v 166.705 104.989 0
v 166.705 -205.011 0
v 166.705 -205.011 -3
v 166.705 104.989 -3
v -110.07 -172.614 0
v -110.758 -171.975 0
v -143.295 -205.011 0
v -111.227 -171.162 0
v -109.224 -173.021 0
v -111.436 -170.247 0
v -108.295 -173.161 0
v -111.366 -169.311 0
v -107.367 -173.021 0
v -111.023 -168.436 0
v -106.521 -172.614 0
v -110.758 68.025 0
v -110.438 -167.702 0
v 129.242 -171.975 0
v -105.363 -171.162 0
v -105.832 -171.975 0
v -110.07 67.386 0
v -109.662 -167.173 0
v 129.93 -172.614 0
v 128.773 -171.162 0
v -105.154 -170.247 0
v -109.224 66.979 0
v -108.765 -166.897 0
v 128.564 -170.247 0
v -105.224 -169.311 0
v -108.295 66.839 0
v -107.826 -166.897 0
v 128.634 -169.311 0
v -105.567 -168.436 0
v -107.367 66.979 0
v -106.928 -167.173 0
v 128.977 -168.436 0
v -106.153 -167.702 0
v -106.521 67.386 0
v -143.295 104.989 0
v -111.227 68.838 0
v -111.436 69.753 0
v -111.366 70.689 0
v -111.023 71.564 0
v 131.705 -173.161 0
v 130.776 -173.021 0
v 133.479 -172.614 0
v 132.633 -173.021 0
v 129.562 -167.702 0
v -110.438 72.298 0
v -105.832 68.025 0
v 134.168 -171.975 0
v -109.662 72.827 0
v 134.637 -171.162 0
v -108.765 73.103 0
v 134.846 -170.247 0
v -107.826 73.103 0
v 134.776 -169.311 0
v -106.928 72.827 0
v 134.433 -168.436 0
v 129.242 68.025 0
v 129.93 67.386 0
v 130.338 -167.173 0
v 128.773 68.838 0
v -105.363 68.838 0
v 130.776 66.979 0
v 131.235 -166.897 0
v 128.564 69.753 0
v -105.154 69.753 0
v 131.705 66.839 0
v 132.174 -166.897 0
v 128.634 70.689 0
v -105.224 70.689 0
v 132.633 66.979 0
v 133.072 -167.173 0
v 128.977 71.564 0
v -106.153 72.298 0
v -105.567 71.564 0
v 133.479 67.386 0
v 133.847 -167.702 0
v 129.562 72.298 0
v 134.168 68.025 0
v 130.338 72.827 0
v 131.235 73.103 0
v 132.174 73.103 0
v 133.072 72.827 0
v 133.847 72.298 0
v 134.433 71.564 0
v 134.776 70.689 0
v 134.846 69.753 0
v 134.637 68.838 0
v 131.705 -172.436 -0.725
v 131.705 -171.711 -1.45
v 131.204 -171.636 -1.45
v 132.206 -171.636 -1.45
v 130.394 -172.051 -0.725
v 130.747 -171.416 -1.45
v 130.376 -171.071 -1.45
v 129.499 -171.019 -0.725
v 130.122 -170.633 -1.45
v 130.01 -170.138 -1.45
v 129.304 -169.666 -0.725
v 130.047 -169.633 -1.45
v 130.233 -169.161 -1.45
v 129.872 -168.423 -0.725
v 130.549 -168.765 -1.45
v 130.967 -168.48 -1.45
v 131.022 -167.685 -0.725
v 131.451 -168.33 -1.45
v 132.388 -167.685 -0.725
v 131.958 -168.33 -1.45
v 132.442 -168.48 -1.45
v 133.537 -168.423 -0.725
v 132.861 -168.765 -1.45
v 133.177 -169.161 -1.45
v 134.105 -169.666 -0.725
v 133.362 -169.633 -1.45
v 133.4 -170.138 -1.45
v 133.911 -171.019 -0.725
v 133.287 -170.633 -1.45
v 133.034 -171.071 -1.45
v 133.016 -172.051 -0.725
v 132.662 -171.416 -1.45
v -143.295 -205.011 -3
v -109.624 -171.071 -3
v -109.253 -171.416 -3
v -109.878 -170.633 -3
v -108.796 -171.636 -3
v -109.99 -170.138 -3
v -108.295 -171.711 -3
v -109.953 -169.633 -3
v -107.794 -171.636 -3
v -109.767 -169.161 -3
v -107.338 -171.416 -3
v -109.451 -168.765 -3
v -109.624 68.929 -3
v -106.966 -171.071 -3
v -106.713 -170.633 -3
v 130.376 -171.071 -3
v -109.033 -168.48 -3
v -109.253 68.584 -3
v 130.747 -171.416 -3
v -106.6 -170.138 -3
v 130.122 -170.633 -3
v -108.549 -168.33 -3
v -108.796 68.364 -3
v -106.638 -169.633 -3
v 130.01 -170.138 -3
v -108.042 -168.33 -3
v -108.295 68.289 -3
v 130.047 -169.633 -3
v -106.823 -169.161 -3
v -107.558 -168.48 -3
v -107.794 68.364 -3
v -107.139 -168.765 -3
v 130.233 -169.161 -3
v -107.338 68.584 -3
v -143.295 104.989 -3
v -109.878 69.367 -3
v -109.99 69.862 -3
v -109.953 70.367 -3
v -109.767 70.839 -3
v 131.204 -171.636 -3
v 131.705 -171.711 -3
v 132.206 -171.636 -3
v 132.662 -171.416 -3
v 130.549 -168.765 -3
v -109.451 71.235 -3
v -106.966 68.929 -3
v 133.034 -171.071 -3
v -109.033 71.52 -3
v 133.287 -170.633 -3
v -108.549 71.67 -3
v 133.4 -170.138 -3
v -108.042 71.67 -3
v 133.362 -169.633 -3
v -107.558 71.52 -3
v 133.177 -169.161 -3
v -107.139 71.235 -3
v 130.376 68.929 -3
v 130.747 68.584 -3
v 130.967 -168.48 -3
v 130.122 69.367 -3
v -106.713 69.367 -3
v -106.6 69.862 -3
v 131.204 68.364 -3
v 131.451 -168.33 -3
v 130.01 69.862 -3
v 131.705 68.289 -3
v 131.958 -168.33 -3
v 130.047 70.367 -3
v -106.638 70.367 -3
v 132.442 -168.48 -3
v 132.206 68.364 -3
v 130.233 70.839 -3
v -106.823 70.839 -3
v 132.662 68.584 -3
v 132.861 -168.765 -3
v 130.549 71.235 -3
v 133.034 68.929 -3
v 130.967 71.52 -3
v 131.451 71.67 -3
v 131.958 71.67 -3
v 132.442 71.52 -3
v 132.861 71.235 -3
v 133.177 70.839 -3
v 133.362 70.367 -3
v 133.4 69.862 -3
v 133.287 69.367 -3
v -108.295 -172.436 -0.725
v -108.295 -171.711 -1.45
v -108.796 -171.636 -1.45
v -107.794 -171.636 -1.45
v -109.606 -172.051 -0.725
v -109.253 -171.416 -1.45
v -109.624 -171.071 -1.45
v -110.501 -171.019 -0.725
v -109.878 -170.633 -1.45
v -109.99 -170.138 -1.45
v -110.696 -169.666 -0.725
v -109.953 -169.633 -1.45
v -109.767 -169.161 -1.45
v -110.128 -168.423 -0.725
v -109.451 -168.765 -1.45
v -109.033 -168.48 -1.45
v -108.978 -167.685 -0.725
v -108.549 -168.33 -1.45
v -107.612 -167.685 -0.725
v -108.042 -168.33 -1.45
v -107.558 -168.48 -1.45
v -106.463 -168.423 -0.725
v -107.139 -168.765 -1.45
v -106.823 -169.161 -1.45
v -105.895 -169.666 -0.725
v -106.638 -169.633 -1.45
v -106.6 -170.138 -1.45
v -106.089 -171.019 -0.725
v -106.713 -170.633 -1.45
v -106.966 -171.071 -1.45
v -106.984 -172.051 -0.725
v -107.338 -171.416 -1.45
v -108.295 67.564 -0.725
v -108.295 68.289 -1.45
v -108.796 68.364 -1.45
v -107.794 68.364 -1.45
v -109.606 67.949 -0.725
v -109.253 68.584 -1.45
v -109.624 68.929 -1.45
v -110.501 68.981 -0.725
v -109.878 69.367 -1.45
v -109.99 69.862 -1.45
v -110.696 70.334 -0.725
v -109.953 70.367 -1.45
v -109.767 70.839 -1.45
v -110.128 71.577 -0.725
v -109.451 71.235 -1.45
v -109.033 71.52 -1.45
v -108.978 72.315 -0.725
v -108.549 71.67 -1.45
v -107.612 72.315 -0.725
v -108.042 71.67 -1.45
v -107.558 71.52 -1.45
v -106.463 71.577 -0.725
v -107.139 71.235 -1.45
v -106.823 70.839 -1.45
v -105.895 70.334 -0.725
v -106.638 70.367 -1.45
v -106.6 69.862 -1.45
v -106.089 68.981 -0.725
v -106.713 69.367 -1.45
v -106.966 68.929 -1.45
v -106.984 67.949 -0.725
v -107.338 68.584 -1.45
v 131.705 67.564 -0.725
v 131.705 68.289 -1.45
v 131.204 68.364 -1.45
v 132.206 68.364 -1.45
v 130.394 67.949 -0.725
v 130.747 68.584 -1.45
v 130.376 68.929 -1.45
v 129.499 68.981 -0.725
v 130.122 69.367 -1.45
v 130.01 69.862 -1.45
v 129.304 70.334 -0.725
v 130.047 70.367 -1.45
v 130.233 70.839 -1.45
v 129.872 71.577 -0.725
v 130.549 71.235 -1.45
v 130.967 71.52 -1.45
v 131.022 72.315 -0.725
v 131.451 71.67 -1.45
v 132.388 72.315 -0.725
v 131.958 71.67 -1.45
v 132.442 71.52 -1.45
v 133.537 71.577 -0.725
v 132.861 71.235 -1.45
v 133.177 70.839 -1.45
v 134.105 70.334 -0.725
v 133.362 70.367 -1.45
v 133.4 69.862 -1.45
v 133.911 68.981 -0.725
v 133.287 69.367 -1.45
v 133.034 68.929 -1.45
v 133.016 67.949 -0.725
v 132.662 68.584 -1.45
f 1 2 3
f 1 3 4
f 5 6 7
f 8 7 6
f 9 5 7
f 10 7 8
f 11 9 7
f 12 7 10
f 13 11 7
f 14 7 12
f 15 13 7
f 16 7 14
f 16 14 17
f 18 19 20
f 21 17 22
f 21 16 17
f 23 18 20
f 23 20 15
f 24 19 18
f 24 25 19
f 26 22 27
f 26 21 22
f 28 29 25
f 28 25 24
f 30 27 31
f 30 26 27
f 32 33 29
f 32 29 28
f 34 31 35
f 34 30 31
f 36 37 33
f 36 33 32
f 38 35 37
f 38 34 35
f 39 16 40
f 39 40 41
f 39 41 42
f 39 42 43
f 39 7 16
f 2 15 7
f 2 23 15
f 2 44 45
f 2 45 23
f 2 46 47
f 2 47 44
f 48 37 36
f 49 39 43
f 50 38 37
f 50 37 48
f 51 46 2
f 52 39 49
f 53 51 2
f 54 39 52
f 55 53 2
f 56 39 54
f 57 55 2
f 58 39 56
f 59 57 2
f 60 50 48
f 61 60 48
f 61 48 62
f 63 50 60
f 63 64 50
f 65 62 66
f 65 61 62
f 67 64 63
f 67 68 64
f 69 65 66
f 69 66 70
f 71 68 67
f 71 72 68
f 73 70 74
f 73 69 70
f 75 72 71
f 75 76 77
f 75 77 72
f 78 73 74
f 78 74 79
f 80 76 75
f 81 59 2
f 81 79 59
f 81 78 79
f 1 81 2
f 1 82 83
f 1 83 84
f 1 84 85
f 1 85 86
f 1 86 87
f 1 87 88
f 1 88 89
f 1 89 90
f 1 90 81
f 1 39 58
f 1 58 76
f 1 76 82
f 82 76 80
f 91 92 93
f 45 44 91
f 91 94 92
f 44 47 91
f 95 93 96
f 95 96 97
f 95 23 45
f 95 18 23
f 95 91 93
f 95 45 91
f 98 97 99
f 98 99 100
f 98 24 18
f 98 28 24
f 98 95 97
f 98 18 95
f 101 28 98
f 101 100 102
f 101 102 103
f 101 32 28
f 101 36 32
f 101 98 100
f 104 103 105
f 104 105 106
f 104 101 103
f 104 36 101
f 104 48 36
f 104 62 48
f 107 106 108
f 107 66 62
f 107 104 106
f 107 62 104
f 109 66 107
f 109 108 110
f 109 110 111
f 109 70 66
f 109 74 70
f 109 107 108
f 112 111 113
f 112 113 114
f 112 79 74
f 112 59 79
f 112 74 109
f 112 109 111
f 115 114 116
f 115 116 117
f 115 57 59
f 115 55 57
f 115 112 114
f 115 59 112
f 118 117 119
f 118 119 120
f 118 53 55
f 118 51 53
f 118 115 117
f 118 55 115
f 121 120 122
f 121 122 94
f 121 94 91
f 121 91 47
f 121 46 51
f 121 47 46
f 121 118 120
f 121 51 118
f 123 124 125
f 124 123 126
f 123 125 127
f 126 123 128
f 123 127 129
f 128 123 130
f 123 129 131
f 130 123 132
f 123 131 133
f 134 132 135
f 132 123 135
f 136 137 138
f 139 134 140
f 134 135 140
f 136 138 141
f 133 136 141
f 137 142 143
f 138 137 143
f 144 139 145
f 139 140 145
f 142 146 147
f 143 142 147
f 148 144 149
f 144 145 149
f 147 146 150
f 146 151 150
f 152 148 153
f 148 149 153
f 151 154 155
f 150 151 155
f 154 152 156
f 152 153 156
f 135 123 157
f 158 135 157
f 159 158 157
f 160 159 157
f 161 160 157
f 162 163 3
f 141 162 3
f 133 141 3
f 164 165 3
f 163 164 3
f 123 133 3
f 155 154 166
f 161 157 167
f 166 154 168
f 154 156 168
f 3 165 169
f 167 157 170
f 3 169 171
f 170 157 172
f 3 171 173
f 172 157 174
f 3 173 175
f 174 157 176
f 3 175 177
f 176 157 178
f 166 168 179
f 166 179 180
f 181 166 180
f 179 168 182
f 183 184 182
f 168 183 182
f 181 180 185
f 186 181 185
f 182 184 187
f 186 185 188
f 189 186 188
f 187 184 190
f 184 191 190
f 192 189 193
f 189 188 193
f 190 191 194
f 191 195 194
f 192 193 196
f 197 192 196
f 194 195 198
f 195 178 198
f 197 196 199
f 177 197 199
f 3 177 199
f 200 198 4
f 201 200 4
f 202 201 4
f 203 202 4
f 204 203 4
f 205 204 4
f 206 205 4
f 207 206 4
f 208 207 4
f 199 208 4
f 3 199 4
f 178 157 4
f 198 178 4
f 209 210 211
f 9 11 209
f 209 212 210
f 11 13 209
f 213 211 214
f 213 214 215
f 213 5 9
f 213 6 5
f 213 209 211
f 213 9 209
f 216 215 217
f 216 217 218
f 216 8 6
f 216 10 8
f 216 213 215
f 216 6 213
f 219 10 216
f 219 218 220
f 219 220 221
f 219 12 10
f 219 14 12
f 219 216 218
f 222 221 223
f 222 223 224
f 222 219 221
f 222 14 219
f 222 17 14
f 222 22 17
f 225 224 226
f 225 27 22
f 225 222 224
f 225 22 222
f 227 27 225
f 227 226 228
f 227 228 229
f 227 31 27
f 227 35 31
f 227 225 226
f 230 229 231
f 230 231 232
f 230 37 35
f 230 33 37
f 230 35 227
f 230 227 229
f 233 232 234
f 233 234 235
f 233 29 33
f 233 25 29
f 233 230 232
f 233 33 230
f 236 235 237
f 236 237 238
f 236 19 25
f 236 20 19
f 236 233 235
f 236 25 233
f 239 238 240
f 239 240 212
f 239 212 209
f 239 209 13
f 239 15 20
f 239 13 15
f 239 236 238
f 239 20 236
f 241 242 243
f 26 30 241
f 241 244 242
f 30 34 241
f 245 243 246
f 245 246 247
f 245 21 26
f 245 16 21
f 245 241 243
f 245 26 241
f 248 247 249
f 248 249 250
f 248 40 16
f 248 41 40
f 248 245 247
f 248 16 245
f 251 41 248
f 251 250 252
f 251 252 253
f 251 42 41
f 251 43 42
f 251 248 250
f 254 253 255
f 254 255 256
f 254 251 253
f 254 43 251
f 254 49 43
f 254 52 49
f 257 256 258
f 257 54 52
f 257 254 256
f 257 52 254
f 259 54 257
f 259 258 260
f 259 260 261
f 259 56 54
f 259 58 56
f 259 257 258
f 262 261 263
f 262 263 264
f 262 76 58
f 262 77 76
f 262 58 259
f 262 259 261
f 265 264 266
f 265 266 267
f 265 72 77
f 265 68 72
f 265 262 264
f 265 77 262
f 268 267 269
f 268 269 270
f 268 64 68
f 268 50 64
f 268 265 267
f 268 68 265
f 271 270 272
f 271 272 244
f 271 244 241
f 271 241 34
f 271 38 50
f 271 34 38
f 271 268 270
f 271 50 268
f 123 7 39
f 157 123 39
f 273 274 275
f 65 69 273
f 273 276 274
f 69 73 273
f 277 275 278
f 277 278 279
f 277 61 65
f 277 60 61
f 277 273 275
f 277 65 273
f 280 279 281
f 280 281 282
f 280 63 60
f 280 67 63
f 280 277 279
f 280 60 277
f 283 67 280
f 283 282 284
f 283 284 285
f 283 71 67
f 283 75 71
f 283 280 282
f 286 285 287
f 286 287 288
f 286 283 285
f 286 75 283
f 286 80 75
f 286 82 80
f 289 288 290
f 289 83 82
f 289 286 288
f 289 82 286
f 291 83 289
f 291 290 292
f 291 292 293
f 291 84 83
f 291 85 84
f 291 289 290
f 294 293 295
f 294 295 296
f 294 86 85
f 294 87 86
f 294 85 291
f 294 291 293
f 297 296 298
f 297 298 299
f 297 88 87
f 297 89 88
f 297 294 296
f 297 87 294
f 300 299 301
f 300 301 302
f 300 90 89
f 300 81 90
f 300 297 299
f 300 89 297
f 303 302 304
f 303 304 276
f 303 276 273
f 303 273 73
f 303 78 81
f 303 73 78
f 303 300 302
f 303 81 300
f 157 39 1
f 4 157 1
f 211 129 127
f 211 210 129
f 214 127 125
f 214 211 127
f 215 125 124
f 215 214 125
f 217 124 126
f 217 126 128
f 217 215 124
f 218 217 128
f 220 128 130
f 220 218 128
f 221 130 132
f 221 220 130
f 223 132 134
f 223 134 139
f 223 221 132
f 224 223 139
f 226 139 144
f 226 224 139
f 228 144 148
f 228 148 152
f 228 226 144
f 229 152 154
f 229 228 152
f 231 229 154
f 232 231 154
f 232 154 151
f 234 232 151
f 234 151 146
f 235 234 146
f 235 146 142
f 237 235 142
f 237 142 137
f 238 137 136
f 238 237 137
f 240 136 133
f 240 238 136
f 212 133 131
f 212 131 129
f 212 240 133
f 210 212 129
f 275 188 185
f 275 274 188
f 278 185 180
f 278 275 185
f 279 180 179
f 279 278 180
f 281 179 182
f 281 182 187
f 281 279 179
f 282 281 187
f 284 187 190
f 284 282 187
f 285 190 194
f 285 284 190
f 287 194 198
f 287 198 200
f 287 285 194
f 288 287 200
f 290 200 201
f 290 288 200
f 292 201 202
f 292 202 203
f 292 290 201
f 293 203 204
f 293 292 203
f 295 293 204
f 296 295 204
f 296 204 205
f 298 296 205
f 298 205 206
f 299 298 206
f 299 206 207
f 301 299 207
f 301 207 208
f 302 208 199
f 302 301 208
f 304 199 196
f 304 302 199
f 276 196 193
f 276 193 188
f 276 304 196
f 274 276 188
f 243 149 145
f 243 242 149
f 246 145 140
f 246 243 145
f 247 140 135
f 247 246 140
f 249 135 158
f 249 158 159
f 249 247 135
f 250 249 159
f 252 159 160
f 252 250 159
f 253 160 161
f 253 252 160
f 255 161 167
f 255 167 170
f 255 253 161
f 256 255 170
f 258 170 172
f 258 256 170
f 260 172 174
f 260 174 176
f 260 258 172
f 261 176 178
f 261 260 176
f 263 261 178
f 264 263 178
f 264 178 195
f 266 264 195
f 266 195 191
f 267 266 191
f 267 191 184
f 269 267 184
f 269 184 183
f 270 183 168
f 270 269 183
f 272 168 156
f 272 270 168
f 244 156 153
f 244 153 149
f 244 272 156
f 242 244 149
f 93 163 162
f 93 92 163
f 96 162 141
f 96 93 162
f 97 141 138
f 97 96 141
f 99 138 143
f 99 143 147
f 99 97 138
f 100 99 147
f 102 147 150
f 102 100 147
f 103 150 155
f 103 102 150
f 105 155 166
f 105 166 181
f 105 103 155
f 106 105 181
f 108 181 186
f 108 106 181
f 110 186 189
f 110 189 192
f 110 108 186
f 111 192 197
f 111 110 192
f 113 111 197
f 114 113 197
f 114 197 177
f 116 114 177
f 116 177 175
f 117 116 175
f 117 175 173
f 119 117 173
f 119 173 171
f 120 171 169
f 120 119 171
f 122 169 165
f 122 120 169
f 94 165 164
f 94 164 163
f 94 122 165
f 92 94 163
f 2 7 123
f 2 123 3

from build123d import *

# Parameters (mm, degrees)
SKETCH_1_W                  = 310
SKETCH_1_H                  = 310
EXTRUDE_1_DEPTH             = 3
HOLE_WIZARD_M3_1_AT_2_COUNT = 2
HOLE_WIZARD_M3_1_AT_2_PITCH = 240
HOLE_WIZARD_M3_1_AT_3_COUNT = 2
HOLE_WIZARD_M3_1_AT_3_PITCH = 339.41125497
HOLE_WIZARD_M3_1_AT_4_COUNT = 2
HOLE_WIZARD_M3_1_AT_4_PITCH = 240


with BuildPart() as part:
    # 草图1 → 凸台-拉伸1 (new body)
    with BuildSketch(Plane.XY):
        with Locations((11.704805492, -50.011441648)):
            Rectangle(SKETCH_1_W, SKETCH_1_H)
    extrude(amount=-EXTRUDE_1_DEPTH)

    # 草图3 → M3 平头机械螺钉的锥形沉头孔1 (revolve, cut)
    with BuildSketch(Plane(origin=(-108.295194508, 69.988558352, 0), x_dir=(0, -1, 0), z_dir=(1, 0, 0))):
        Polygon((0, 0), (0, 3), (1.7, 3), (1.7, 1.45), (3.15, 0), align=None)
    hole_wizard_m3_1 = revolve(axis=Axis((-108.295194508, 69.988558352, 6.35), (0, 0, -1)), mode=Mode.SUBTRACT)

    # M3 平头机械螺钉的锥形沉头孔1 at 2: M3 平头机械螺钉的锥形沉头孔1 ×2
    with Locations(*[(i * HOLE_WIZARD_M3_1_AT_2_PITCH, 0, 0) for i in range(1, HOLE_WIZARD_M3_1_AT_2_COUNT)]):
        add(hole_wizard_m3_1, mode=Mode.SUBTRACT)

    # M3 平头机械螺钉的锥形沉头孔1 at 3: M3 平头机械螺钉的锥形沉头孔1 ×2
    with Locations(*[Vector(0.707106781, -0.707106781, 0) * (i * HOLE_WIZARD_M3_1_AT_3_PITCH) for i in range(1, HOLE_WIZARD_M3_1_AT_3_COUNT)]):
        add(hole_wizard_m3_1, mode=Mode.SUBTRACT)

    # M3 平头机械螺钉的锥形沉头孔1 at 4: M3 平头机械螺钉的锥形沉头孔1 ×2
    with Locations(*[(0, -i * HOLE_WIZARD_M3_1_AT_4_PITCH, 0) for i in range(1, HOLE_WIZARD_M3_1_AT_4_COUNT)]):
        add(hole_wizard_m3_1, mode=Mode.SUBTRACT)


solid = part.part
